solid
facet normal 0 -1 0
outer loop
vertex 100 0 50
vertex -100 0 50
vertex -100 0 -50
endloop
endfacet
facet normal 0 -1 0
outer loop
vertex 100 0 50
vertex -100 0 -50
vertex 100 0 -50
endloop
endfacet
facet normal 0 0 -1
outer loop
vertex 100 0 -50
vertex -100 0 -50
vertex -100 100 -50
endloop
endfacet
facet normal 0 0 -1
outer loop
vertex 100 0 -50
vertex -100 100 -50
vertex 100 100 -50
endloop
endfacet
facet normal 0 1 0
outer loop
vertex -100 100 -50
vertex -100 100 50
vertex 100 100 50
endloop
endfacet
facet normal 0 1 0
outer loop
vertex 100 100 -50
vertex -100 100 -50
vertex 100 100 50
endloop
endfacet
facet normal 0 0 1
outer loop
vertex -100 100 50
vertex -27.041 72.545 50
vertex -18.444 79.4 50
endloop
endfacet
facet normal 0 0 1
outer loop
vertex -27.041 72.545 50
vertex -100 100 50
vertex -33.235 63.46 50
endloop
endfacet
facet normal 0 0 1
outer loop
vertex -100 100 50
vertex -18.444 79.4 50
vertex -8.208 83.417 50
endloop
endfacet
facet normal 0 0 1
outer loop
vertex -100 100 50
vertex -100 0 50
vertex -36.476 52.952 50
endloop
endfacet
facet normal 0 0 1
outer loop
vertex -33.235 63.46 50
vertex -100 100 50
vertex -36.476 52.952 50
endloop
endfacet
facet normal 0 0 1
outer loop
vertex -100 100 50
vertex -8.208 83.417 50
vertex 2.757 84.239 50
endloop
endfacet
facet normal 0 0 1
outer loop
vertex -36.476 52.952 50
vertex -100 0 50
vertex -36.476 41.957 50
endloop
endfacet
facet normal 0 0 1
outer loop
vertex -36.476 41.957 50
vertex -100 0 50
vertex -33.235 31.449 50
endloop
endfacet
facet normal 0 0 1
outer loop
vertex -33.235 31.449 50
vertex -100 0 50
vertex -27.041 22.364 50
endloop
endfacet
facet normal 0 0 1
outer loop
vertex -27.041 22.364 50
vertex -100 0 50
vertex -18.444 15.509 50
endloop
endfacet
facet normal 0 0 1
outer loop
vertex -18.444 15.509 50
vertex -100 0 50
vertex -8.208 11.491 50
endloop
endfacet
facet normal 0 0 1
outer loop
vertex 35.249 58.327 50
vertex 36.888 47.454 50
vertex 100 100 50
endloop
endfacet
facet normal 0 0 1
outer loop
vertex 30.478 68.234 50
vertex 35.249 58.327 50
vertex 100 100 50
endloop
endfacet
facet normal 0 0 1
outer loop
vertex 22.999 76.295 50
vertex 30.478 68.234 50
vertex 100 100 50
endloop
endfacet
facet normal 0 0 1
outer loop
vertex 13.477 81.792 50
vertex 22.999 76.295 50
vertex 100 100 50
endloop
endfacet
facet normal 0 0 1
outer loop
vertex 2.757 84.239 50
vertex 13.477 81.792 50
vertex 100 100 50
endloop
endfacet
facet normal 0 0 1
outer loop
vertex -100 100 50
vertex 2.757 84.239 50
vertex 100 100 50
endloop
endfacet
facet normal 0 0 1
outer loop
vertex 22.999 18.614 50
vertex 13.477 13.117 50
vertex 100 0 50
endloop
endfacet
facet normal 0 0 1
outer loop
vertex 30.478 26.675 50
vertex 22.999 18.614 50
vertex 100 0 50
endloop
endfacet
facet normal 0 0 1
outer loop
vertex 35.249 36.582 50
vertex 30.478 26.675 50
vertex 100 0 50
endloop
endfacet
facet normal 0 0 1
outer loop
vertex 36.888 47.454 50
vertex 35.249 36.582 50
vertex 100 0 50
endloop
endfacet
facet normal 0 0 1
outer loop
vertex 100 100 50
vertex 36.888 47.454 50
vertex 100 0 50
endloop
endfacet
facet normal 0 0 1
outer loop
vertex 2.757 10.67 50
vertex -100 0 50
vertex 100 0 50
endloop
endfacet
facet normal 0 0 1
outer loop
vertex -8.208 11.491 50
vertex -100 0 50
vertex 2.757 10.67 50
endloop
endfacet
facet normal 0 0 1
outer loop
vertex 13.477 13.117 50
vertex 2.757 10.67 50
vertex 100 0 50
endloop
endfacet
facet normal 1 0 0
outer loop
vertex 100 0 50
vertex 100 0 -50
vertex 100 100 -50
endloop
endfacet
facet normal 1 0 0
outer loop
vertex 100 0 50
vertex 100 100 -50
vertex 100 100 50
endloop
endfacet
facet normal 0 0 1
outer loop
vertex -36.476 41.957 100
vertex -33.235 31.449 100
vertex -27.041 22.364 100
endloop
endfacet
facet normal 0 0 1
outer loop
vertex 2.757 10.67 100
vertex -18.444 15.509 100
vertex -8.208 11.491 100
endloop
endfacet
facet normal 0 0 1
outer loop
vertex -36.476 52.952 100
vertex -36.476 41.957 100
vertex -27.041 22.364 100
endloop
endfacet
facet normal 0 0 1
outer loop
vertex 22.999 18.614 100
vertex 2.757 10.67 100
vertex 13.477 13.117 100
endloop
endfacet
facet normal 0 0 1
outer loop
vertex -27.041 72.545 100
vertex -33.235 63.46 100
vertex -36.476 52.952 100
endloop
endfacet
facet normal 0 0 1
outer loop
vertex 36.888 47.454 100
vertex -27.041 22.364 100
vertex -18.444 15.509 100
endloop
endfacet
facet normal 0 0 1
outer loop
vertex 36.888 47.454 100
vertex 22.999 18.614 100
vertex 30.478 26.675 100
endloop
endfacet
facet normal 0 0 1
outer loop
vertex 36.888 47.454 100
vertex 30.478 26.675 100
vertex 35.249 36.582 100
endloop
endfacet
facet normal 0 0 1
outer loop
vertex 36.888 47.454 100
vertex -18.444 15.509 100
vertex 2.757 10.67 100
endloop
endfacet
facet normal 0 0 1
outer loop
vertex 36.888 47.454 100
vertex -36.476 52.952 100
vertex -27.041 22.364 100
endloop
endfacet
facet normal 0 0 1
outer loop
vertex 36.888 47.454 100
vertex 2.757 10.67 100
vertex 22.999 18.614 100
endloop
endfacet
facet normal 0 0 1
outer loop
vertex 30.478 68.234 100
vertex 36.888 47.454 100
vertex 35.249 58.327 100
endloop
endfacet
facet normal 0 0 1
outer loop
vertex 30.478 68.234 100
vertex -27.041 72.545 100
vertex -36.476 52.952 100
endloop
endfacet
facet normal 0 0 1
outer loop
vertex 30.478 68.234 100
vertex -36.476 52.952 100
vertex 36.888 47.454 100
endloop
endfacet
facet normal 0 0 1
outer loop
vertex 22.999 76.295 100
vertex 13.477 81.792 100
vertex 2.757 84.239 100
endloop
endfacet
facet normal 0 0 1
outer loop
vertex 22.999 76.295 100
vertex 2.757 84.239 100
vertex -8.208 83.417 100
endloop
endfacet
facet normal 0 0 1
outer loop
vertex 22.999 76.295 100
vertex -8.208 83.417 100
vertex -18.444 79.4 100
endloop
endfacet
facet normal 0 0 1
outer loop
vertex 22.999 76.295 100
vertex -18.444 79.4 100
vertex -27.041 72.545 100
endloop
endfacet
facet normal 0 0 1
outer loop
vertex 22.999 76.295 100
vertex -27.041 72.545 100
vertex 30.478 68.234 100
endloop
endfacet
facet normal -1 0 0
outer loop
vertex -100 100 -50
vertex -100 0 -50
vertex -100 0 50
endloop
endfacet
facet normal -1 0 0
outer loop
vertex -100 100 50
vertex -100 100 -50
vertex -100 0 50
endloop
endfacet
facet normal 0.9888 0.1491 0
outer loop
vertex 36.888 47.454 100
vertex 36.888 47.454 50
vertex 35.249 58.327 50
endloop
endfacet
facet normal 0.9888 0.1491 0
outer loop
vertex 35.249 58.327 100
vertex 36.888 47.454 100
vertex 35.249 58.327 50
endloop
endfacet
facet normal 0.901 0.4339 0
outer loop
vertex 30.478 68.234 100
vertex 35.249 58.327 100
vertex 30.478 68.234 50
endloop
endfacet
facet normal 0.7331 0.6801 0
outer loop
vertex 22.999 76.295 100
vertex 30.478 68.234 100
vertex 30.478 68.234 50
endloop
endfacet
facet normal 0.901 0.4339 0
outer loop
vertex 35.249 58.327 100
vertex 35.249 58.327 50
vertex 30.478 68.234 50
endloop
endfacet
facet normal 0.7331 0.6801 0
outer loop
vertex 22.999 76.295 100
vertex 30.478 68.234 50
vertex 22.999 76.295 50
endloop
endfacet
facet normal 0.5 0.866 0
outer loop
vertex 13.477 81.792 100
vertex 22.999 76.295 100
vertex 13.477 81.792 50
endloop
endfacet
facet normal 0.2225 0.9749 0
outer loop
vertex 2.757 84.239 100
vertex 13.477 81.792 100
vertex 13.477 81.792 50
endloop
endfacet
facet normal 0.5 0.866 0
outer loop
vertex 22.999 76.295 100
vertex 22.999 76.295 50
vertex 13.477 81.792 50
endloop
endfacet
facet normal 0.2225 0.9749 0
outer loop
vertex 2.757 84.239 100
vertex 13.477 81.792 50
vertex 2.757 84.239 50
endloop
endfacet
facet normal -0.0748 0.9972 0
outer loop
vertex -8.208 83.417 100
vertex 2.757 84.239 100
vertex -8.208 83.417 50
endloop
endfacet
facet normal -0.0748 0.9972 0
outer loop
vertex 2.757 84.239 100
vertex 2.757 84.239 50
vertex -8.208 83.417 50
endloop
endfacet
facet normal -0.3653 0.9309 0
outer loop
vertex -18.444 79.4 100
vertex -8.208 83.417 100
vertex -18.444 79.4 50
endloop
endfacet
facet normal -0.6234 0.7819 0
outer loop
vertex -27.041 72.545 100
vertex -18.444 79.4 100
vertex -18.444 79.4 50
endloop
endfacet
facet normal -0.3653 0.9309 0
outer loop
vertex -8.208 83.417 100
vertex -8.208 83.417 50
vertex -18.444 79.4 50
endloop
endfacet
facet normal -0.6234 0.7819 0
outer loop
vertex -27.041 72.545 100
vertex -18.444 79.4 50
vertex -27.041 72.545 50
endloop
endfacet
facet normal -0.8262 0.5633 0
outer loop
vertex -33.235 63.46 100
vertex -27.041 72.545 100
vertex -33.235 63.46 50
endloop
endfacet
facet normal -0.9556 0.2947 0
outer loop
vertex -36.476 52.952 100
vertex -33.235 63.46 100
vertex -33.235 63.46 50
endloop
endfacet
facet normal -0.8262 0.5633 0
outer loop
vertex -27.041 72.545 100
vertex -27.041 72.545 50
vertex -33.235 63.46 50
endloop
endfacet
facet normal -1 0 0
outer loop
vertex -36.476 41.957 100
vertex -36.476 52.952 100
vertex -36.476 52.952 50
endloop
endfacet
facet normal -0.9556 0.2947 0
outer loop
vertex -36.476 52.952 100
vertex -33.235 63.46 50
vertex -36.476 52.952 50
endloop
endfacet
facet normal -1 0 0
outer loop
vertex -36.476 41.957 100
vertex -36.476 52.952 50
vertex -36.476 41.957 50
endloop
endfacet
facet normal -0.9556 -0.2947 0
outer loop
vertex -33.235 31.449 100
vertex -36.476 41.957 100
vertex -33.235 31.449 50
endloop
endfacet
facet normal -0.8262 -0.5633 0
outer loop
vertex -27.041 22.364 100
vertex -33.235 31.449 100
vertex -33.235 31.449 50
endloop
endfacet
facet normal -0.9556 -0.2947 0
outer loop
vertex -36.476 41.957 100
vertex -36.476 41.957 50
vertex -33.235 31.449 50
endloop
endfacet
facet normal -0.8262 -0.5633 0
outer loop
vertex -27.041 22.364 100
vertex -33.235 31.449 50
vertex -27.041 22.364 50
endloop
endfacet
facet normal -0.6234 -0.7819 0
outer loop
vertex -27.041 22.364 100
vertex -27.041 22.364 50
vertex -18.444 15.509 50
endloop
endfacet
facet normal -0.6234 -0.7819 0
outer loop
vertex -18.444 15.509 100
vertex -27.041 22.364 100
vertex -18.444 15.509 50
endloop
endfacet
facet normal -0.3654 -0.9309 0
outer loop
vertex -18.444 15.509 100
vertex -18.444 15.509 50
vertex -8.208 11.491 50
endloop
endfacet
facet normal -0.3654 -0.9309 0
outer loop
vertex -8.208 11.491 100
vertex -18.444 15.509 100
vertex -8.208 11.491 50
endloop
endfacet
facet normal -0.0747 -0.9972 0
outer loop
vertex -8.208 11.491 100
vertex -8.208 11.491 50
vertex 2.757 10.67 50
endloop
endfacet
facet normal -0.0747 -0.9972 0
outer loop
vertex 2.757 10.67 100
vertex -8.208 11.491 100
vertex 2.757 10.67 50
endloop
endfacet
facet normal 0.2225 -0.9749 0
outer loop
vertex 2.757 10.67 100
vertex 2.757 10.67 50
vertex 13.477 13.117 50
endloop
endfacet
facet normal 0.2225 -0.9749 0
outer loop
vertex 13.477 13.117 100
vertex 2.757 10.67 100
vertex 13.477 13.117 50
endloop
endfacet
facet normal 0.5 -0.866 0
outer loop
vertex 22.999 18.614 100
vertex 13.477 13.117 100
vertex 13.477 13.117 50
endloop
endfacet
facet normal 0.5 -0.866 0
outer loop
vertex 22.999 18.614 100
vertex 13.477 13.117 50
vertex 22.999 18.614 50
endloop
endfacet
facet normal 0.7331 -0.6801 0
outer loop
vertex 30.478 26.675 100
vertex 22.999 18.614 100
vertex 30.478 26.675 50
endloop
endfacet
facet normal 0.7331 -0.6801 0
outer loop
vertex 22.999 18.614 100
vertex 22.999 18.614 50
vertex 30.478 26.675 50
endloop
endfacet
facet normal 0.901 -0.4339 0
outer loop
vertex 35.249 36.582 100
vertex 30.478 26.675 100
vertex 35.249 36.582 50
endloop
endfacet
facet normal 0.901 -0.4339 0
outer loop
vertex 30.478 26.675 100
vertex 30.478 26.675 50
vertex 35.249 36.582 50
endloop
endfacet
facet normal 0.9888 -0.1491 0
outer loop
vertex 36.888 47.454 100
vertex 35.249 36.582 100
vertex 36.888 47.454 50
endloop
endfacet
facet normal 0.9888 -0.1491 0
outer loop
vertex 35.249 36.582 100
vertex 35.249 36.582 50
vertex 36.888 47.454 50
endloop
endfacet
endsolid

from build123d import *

# Parameters (mm, degrees)
F0_W     = 200
F0_H     = 100
F1_DEPTH = 100
F2_R     = 36.887858
F3_DEPTH = 50


with BuildPart() as f1:
    # F0 (on Front) → F1 (new body)
    with BuildSketch(Plane.XZ):
        Rectangle(F0_W, F0_H)
    extrude(amount=-F1_DEPTH)

    # F2 (on face) → F3 (join)
    with BuildSketch(Plane.XY.offset(50)):
        with Locations((0, 47.454495)):
            Circle(F2_R)
    extrude(amount=F3_DEPTH)


solid = f1.part
